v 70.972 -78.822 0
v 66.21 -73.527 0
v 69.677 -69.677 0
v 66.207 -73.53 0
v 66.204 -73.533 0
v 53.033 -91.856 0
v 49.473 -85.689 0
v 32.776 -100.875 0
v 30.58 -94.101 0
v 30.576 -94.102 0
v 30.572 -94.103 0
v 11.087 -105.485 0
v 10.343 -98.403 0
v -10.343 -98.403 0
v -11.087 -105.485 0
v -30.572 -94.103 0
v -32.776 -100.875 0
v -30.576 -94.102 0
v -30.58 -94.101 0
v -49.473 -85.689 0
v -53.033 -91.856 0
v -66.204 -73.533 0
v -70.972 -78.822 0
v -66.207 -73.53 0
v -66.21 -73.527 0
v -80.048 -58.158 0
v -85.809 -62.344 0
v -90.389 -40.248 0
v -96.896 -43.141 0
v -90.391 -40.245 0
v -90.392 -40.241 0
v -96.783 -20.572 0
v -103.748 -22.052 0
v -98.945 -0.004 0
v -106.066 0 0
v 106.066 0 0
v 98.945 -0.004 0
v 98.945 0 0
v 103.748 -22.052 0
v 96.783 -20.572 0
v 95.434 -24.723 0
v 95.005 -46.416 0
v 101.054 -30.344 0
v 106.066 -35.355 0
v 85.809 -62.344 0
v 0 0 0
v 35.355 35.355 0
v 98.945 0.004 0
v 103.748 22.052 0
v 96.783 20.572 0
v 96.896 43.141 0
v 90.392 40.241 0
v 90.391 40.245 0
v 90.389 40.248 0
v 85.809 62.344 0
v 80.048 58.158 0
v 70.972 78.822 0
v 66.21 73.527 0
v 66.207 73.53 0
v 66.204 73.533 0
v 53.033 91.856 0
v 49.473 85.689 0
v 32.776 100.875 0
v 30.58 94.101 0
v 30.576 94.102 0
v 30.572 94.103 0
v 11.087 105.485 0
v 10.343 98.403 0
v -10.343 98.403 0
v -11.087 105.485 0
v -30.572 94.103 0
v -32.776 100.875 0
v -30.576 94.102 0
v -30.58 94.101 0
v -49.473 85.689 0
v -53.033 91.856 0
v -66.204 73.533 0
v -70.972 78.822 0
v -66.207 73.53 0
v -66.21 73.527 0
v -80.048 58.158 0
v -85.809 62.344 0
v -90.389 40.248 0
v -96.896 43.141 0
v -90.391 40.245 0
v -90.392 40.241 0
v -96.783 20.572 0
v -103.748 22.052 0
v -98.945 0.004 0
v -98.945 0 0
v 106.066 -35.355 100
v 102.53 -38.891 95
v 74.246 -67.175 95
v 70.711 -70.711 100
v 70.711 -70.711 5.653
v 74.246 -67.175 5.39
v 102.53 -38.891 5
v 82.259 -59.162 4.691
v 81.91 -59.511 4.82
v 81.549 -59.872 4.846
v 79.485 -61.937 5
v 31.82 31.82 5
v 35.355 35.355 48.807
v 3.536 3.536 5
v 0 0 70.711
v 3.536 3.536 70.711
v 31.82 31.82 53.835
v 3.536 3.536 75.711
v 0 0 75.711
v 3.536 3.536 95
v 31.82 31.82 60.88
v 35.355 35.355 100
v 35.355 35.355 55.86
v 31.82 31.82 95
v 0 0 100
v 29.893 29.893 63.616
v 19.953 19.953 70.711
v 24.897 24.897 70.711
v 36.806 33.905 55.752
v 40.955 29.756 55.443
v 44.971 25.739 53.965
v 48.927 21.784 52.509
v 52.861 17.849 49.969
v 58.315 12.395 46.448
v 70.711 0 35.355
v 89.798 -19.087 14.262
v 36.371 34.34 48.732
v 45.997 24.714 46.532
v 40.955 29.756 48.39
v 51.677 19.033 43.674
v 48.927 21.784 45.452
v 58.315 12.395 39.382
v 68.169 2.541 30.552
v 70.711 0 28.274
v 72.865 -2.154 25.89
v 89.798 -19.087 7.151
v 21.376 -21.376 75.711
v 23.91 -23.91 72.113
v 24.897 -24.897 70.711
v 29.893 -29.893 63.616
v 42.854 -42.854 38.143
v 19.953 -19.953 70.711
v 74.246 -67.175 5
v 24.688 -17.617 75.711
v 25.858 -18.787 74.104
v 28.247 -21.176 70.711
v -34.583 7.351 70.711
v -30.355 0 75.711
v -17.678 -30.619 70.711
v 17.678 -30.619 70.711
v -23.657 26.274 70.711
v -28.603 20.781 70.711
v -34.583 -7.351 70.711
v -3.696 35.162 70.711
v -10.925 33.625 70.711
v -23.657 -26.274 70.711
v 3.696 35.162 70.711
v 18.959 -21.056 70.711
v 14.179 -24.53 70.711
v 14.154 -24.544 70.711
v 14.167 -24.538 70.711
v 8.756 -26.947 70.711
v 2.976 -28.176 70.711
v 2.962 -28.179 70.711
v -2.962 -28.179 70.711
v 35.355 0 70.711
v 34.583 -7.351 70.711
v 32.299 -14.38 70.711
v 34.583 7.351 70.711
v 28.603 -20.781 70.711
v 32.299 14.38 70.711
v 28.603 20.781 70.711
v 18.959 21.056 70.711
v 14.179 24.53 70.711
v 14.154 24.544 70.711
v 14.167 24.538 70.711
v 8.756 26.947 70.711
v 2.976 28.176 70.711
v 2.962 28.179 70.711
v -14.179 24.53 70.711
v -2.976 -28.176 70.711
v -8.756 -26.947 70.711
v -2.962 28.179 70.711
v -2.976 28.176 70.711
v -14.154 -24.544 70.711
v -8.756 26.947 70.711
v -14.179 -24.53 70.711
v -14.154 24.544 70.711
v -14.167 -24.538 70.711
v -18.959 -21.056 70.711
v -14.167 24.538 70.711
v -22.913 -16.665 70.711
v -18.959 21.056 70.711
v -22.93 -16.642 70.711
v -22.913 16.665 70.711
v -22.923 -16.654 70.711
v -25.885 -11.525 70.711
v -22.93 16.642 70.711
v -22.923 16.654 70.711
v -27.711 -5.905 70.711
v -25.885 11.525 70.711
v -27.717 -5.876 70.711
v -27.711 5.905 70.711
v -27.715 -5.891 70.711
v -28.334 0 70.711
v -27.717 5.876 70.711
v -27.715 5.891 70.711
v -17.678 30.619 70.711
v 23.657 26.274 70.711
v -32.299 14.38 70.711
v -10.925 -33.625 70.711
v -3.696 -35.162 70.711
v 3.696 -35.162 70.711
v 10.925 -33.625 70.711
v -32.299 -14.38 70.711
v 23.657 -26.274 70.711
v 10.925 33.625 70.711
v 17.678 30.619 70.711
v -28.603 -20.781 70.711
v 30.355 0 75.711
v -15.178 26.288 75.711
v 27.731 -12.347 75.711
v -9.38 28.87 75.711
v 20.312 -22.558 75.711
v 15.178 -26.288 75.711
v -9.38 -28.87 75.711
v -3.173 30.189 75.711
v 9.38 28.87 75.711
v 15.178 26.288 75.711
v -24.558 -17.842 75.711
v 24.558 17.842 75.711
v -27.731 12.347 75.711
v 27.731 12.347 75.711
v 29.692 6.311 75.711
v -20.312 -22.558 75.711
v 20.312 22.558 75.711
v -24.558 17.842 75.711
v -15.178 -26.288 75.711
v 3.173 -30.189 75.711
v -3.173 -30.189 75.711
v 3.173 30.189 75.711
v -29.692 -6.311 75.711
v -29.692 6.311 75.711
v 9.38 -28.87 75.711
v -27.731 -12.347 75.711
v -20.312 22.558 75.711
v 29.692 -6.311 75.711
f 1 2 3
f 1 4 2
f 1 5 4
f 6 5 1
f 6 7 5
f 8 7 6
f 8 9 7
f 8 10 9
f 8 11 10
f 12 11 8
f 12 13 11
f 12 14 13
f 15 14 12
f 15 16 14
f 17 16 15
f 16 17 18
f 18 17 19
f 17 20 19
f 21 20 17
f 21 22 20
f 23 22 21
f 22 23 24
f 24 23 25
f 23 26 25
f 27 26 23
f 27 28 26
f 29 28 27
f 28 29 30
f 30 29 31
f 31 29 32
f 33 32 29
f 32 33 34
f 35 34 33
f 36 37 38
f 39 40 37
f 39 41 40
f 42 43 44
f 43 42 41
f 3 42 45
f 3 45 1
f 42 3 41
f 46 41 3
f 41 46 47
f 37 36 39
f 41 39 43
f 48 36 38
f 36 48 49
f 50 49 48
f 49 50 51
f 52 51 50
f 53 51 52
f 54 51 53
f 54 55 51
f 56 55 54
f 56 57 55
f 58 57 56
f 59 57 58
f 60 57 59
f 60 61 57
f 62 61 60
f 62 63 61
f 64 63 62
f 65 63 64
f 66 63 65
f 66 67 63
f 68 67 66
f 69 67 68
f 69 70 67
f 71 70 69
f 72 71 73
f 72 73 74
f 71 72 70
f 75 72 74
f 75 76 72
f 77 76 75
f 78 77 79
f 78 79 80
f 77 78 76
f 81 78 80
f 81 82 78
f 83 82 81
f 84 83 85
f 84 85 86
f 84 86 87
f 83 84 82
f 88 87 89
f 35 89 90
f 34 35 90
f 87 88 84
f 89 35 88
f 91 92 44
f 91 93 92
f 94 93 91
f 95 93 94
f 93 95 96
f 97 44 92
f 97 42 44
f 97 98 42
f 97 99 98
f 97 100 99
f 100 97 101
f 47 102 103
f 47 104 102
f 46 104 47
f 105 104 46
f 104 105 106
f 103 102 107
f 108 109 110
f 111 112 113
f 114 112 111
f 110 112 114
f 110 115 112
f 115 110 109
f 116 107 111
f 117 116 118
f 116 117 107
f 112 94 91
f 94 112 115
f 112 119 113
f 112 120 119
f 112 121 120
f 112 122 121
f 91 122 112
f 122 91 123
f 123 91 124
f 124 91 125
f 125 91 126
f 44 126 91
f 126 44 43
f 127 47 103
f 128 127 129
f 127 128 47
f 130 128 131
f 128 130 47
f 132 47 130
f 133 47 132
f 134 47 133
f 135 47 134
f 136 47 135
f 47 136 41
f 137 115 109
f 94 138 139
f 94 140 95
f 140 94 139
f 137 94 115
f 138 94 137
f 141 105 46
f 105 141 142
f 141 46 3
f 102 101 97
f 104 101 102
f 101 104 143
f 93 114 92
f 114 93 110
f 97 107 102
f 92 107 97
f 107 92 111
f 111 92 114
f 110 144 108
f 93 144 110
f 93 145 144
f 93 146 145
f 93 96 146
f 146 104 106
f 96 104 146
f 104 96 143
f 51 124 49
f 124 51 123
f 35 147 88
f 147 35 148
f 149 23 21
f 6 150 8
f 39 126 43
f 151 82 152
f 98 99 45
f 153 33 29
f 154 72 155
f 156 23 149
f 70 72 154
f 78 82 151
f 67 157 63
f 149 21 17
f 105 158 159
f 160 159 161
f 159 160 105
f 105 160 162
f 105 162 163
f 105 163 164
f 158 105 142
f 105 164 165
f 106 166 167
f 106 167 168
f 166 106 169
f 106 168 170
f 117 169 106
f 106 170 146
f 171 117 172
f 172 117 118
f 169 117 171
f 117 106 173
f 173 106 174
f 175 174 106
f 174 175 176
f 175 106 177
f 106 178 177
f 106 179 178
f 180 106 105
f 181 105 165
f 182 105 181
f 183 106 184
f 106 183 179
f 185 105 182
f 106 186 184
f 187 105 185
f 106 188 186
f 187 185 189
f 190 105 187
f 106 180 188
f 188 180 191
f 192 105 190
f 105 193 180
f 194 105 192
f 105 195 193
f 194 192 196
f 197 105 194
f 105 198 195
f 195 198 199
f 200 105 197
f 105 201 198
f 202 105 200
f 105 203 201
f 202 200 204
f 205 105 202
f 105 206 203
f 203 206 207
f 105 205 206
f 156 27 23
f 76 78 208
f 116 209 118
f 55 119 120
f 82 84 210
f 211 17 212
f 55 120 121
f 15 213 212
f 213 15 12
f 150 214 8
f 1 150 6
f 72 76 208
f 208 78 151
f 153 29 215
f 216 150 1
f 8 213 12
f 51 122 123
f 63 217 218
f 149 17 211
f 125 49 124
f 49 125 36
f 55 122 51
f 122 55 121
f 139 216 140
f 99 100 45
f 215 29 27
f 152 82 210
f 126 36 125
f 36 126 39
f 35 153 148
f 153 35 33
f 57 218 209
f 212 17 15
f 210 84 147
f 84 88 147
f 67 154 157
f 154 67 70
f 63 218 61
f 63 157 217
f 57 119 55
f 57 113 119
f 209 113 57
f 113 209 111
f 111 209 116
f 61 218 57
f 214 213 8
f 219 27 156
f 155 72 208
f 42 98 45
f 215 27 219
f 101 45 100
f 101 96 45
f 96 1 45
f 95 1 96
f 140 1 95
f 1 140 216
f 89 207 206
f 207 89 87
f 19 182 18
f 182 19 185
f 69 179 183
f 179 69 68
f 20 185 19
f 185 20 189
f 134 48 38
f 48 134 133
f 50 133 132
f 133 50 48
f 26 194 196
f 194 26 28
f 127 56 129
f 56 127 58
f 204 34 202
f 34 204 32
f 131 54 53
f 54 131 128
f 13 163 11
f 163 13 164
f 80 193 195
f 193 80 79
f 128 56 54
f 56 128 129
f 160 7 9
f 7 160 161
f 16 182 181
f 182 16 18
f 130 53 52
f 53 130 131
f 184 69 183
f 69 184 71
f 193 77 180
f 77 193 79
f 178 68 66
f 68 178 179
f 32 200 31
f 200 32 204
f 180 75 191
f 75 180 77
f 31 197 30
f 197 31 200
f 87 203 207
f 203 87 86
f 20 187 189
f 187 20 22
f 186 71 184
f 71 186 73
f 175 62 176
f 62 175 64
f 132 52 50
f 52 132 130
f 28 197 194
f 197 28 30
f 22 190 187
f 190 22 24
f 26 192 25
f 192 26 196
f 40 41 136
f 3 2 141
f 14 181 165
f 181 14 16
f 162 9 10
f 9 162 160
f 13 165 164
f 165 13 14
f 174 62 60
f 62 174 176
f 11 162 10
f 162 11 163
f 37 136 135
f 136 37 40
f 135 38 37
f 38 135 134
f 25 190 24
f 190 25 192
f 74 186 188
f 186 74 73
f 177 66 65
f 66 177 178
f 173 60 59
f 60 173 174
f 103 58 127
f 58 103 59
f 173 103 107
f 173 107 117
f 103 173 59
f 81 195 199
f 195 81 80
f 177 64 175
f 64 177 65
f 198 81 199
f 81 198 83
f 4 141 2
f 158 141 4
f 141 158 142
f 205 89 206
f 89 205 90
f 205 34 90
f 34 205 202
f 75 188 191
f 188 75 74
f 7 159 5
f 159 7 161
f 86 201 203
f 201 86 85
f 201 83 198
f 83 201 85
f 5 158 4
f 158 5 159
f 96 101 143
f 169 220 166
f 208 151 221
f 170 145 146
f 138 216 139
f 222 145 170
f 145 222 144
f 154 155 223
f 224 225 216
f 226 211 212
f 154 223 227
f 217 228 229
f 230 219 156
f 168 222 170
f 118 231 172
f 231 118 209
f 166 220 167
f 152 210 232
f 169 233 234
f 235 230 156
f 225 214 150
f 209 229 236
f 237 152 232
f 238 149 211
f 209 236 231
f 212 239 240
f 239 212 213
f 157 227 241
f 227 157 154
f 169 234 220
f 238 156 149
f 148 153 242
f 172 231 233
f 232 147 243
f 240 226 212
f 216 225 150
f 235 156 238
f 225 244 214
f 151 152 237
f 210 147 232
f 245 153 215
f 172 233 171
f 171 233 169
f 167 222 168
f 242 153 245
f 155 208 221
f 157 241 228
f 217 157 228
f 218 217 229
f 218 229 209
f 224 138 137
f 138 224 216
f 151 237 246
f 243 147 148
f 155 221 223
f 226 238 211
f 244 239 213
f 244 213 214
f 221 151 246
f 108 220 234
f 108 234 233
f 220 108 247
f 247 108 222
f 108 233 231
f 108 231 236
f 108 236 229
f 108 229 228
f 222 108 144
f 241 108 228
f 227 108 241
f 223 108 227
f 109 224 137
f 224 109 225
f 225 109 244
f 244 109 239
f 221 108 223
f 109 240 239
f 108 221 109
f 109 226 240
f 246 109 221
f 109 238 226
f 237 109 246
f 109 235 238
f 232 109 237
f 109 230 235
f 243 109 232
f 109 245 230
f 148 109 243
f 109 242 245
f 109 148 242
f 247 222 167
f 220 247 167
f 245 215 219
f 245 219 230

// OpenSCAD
// file: pw_primitives.scad
module hollow_cube(length, width, height, wall_t) {
    difference() {
        two_t = wall_t*2;
        cube([length, width, height]);
        translate([wall_t, wall_t, -0.1]) 
          cube([length-two_t, width-two_t, height+0.2]);
    }
}

module hollow_cylinder(width, height, wall_t) {
    difference() {
        two_t = wall_t*2;
        cylinder(h=height, r=width/2);
        translate([0, 0, -0.1])
          cylinder(h=height+0.2, r=(width-two_t)/2);
    }
}

module rounded_box(length, width, height, outer_r, inner_r, thickness) {
    outer_d = outer_r*2;
    inner_t = thickness+inner_r;
    inner_d = outer_d+inner_t*2;
    translate([outer_r, outer_r, outer_r]) difference() {
        // outer rounded rectangle
        minkowski() {
            cube([length-outer_d, width-outer_d, height-outer_r]);
            sphere(r=outer_r);
        };
        // top face
        translate([-outer_r, -outer_r, height-outer_r]) 
          cube([length+2*outer_r, width+2*outer_r, outer_r]);
        // inner rounded rectangle
        translate([inner_t, inner_t, inner_t]) minkowski() {
            cube([length-inner_d, width-inner_d, height]);
            sphere(r=inner_r);
        };
    }
}

module ring_rt(height, radius, thickness) { difference() {
    // For when you know the outer radius and the wall thickness.
    cylinder(h=height, r=radius);
    translate([0, 0, -0.05]) 
      cylinder(h=height+0.1, r=max(radius-thickness, 0));
}};

module ring_oi(height, o_radius, i_radius) { difference() {
    // For when you know the outer and inner radius but not the wall thickness.
    cylinder(h=height, r=o_radius);
    translate([0, 0, -0.05]) 
      cylinder(h=height+0.1, r=i_radius);   
}};

module hollow_cone_rt(height, bottom_radius, top_radius, thickness) { difference() {
    // For when you know the outer radii and the wall thickness.
    cylinder(h=height, r1=bottom_radius, r2=top_radius);
    translate([0, 0, -0.05]) cylinder(
        h=height+0.1, 
        r1=max(bottom_radius-thickness, 0), r2=max(top_radius-thickness, 0)
    );
}};

module hollow_cone_oi(
    height, o_bot_radius, i_bot_radius, o_top_radius, i_top_radius,
) { difference() {
    // For when you know the outer and inner radii but not the wall thickness.
    cylinder(h=height, r1=o_bot_radius, r2=o_top_radius);
    translate([0, 0, -0.05]) 
      cylinder(h=height+0.1, r1=i_bot_radius, r2=i_top_radius);
}};
// main file
include <pw_primitives.scad>;

ols = 100; // Outlet long side
oss = 50; // Outlet short side
oh = 100; // Outlet height
thick = 5;  // wall thickness
// Rotations by 45 degree shorten the side by 1/sqrt(2) or ~ 0.70711

ang_shorten = 1/sqrt(2);
ols_45 = ols * ang_shorten;
oss_45 = oss * ang_shorten;
outlet_rotation = [0, 90, -45];
outlet_translation = [0, 0, ols];

union() {
    translate(outlet_translation) rotate(outlet_rotation) difference() {
        hollow_cube(ols, oss, oh, thick);
    }
    difference() {
        hollow_cone_rt(
            height=ols_45,
            bottom_radius=ols_45+oss_45, 
            top_radius=oss_45, 
            thickness=thick*sqrt(2)
        );
        translate(outlet_translation) rotate(outlet_rotation) cube([ols, oss, oh]);
    }
    translate([0, 0, ols_45]) cylinder(
        h=thick, r1=oss_45, r2=oss_45-thick);
}
